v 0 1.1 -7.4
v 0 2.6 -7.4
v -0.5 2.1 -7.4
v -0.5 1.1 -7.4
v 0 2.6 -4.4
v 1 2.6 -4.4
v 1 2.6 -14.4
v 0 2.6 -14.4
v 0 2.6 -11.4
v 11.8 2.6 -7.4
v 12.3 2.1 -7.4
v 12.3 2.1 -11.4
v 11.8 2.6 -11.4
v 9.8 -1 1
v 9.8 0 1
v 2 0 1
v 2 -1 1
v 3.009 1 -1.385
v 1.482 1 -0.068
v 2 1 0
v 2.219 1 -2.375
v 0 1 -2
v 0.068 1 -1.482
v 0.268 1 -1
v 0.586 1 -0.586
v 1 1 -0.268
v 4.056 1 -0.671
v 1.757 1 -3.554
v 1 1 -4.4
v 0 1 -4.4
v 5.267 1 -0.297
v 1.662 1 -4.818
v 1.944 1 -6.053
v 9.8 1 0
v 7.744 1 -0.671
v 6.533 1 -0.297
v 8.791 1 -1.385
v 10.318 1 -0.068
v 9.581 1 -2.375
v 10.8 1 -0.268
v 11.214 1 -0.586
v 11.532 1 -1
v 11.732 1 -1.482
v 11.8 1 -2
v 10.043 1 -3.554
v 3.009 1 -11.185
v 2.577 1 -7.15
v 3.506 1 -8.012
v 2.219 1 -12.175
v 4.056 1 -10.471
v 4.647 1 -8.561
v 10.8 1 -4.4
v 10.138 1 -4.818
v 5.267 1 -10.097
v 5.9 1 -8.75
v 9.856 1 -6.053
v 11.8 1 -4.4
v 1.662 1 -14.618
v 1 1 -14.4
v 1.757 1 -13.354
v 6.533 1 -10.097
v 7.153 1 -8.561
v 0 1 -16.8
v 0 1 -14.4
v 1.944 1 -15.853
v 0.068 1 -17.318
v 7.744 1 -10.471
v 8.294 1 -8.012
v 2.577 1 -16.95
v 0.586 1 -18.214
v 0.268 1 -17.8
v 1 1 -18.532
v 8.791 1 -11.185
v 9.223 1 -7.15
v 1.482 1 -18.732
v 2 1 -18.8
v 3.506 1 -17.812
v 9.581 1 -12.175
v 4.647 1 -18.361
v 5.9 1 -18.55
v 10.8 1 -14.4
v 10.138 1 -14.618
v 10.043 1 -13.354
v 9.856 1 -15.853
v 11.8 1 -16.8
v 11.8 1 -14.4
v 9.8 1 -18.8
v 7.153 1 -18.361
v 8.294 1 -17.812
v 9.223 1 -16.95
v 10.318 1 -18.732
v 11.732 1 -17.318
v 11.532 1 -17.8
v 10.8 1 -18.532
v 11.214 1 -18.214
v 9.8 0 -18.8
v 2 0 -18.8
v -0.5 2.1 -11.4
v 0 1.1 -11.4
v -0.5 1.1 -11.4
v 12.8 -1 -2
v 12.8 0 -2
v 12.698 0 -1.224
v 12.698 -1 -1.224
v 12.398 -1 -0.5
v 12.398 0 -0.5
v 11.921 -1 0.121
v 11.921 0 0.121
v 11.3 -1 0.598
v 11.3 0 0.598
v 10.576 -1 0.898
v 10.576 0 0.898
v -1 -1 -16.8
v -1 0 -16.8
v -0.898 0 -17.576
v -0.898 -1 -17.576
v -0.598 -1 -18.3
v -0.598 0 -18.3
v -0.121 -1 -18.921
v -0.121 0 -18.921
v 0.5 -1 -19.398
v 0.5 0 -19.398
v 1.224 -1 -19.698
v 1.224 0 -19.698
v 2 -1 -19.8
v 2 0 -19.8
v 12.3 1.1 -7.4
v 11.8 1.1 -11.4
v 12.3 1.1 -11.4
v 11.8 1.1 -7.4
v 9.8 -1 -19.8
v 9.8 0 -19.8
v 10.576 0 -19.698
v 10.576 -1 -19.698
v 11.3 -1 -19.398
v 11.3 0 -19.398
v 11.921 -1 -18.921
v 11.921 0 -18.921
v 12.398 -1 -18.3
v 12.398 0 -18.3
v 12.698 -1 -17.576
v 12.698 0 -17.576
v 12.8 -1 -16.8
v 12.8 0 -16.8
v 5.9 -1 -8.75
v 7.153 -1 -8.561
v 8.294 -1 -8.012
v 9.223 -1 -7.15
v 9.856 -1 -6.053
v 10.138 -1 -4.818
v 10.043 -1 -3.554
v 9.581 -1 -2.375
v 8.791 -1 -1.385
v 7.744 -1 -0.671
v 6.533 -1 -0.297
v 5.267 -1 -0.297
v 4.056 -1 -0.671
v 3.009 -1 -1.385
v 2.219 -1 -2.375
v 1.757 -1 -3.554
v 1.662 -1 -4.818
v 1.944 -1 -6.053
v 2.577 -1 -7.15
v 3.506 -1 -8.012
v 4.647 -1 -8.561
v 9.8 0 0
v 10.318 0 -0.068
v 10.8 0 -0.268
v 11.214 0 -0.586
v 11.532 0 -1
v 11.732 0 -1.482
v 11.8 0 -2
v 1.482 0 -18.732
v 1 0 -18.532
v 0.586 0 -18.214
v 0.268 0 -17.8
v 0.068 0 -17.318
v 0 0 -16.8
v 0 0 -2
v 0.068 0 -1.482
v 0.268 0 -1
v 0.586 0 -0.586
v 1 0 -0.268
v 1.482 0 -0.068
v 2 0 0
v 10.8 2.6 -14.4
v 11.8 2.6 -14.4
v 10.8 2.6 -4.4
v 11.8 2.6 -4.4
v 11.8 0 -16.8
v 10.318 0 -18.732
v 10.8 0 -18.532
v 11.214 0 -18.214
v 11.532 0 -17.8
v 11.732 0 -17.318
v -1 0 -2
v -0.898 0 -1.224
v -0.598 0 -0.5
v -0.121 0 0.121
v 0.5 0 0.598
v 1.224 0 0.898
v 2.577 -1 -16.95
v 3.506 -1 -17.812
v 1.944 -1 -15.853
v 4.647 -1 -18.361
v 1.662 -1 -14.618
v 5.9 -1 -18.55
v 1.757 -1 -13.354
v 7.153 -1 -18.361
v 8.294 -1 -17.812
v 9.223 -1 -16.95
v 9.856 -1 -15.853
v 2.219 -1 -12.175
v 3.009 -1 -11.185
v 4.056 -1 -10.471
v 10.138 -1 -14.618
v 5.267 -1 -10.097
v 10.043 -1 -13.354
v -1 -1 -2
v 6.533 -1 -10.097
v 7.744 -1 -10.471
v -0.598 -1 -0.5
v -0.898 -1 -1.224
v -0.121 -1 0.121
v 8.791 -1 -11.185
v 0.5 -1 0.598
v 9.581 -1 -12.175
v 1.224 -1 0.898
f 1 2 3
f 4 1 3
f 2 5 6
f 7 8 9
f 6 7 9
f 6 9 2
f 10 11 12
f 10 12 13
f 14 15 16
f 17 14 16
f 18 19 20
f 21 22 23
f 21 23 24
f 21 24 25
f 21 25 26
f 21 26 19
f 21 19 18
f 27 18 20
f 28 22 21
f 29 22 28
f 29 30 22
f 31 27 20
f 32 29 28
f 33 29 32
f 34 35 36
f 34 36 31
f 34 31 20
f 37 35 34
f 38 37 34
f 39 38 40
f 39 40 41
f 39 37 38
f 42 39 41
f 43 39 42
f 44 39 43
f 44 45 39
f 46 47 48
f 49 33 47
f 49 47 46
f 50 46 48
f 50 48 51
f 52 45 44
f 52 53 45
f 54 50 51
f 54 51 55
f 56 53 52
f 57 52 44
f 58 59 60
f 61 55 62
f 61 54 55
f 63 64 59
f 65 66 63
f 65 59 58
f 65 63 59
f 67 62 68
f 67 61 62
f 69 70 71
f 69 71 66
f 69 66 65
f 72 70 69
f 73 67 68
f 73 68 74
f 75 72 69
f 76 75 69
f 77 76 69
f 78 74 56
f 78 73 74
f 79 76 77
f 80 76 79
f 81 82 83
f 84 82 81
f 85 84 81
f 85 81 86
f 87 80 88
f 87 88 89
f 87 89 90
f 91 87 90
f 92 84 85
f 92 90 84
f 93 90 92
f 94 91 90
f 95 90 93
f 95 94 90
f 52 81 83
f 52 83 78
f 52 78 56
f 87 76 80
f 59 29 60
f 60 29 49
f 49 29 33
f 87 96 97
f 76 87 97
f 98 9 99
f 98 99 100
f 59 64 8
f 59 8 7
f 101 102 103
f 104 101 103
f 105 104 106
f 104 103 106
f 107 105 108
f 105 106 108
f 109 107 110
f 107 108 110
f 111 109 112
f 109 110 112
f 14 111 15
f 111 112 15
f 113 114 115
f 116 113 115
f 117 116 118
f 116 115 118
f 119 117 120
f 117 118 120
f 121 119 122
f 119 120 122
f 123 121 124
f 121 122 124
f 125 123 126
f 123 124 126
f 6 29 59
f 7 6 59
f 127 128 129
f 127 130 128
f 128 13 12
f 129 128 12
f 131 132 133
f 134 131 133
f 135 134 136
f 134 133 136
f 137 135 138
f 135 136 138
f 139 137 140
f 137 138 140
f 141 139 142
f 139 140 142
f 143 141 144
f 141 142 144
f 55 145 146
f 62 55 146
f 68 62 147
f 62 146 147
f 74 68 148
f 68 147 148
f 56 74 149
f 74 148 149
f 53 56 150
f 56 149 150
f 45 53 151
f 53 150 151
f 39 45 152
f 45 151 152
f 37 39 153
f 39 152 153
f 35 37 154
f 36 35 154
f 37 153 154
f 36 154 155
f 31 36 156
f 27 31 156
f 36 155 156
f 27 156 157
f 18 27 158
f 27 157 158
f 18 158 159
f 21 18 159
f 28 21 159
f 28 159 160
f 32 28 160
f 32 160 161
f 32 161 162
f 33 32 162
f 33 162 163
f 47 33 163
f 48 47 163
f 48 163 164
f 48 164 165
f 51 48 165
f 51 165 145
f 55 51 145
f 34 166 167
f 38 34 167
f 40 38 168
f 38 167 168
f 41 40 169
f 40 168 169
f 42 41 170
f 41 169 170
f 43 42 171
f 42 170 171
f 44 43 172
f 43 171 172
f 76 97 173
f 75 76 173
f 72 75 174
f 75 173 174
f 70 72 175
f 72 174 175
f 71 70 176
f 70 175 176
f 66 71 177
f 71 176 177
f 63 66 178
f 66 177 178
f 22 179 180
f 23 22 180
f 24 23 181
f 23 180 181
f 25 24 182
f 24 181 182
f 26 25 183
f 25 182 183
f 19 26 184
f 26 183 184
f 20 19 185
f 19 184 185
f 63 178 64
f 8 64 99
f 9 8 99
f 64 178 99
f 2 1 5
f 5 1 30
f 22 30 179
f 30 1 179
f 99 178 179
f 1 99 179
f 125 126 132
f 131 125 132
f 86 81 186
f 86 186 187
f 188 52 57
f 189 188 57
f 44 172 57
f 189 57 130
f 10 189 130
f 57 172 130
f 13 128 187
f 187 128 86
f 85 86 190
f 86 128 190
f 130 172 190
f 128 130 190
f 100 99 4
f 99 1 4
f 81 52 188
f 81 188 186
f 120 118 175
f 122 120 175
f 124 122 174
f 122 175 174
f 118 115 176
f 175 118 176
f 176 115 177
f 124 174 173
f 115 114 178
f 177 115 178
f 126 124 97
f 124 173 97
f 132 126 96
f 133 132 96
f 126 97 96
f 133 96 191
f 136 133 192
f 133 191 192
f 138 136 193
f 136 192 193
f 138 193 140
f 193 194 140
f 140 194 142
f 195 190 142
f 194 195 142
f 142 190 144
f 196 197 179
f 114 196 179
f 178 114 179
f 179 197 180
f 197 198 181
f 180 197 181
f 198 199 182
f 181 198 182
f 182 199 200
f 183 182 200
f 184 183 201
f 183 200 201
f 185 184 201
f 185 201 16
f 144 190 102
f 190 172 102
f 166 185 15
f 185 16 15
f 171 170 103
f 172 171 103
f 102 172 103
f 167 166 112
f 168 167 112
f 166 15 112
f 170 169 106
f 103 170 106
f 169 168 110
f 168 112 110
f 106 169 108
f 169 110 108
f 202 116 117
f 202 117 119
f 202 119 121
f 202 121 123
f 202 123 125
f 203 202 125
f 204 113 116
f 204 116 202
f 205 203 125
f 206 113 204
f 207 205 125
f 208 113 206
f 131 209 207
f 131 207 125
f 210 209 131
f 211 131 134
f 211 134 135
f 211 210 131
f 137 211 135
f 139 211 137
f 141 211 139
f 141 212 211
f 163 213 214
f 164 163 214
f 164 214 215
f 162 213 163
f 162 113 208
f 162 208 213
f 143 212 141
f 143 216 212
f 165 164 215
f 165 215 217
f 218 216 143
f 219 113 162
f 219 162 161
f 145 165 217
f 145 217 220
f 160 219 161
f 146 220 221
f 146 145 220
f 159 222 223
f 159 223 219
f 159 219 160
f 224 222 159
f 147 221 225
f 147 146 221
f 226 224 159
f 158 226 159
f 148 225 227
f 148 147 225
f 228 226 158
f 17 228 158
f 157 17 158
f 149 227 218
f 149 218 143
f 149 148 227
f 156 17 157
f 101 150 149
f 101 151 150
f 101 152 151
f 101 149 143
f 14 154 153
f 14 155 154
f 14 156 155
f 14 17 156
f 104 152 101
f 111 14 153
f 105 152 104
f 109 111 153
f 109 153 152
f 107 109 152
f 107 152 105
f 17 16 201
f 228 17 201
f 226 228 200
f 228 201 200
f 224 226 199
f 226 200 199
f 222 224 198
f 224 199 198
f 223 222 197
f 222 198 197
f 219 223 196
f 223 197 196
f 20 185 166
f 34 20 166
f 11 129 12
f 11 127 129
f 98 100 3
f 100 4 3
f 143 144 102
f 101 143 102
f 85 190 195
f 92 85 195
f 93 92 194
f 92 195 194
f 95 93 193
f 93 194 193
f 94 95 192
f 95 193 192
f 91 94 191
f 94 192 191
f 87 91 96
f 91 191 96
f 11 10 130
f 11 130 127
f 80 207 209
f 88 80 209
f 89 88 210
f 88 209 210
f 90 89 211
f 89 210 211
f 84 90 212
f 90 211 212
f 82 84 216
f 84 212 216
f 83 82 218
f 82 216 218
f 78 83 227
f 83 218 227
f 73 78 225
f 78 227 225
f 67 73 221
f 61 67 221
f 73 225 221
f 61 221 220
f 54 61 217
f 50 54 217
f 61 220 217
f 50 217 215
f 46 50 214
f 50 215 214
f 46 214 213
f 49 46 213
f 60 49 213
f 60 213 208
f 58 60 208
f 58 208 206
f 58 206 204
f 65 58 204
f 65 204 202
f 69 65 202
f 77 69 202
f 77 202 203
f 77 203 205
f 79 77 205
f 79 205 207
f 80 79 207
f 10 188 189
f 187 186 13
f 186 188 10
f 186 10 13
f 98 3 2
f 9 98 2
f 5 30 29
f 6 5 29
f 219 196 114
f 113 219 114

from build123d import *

# Parameters (mm, degrees)
EXTRUDE_1_DEPTH                           = 1
SKETCH_2_W                                = 1
SKETCH_2_H                                = 10
EXTRUDE_2_DEPTH                           = 1.6
EXTRUDE_3_DEPTH                           = 2
EXTRUDE_4_DEPTH                           = 1
MIRROR_1_AT_THE_SECOND_PLANE_COPY_1_DEPTH = 2
SKETCH_5_R                                = 4.25
CUT_EXTRUDE_1_DEPTH                       = 24.850366873


with BuildPart() as part:
    # 草图1 → 凸台-拉伸1 (new body)
    with BuildSketch(Plane(origin=(0, 0, 0), x_dir=(1, 0, 0), z_dir=(0, 1, 0))):
        with BuildLine():
            Line((2, 0), (9.8, 0))
            ThreePointArc((9.8, 0), (11.214213562, 0.585786438), (11.8, 2))
            Line((11.8, 2), (11.8, 16.8))
            ThreePointArc((11.8, 16.8), (11.214213562, 18.214213562), (9.8, 18.8))
            Line((9.8, 18.8), (2, 18.8))
            ThreePointArc((2, 18.8), (0.585786438, 18.214213562), (0, 16.8))
            Line((0, 16.8), (0, 2))
            ThreePointArc((0, 2), (0.585786438, 0.585786438), (2, 0))
        make_face()
    extrude(amount=EXTRUDE_1_DEPTH)

    # 草图2 → 凸台-拉伸2 (add)
    with BuildSketch(Plane(origin=(0, 1, 0), x_dir=(1, 0, 0), z_dir=(0, 1, 0))):
        with Locations((0.5, 9.4)):
            Rectangle(SKETCH_2_W, SKETCH_2_H)
        with Locations((11.3, 9.4)):
            Rectangle(SKETCH_2_W, SKETCH_2_H)
    extrude(amount=EXTRUDE_2_DEPTH)

    # 草图3 → 凸台-拉伸3 (add, symmetric)
    with BuildSketch(Plane.XY.offset(-9.4)):
        Polygon((0, 2.6), (0, 1.1), (-0.5, 1.1), (-0.5, 2.1), align=None)
    extrude_3 = extrude(amount=EXTRUDE_3_DEPTH, both=True)

    # 草图4 → 凸台-拉伸4 (add)
    with BuildSketch(Plane.XZ):
        with BuildLine():
            Line((2, -19.8), (9.8, -19.8))
            ThreePointArc((9.8, -19.8), (11.921320344, -18.921320344), (12.8, -16.8))
            Line((12.8, -16.8), (12.8, -2))
            ThreePointArc((12.8, -2), (11.921320344, 0.121320344), (9.8, 1))
            Line((9.8, 1), (2, 1))
            ThreePointArc((2, 1), (-0.121320344, 0.121320344), (-1, -2))
            Line((-1, -2), (-1, -16.8))
            ThreePointArc((-1, -16.8), (-0.121320344, -18.921320344), (2, -19.8))
        make_face()
    extrude(amount=EXTRUDE_4_DEPTH)

    # 镜向1: 凸台-拉伸3 across plane
    add(extrude_3.mirror(Plane.XY.offset(-9.4)))

    # 镜向1 at the second plane: 凸台-拉伸3 across plane
    add(extrude_3.mirror(Plane.ZY.offset(-5.9)))

    # 镜向1 at the second plane copy 1 sket → 镜向1 at the second plane copy 1 (add, symmetric)
    with BuildSketch(Plane(origin=(11.8, 0, -9.4), x_dir=(-1, 0, 0), z_dir=(0, 0, -1))):
        Polygon((0, 2.6), (0, 1.1), (-0.5, 1.1), (-0.5, 2.1), align=None)
    extrude(amount=MIRROR_1_AT_THE_SECOND_PLANE_COPY_1_DEPTH, both=True)

    # 草图5 → 切除-拉伸1 (cut, through all)
    with BuildSketch(Plane.XZ.offset(1)):
        with Locations(Location((5.9, -4.5, 0), (0, 0, 270))):
            Circle(SKETCH_5_R)
        with Locations(Location((5.9, -14.3, 0), (0, 0, 270))):
            Circle(SKETCH_5_R)
    extrude(amount=-CUT_EXTRUDE_1_DEPTH, mode=Mode.SUBTRACT)


solid = part.part
